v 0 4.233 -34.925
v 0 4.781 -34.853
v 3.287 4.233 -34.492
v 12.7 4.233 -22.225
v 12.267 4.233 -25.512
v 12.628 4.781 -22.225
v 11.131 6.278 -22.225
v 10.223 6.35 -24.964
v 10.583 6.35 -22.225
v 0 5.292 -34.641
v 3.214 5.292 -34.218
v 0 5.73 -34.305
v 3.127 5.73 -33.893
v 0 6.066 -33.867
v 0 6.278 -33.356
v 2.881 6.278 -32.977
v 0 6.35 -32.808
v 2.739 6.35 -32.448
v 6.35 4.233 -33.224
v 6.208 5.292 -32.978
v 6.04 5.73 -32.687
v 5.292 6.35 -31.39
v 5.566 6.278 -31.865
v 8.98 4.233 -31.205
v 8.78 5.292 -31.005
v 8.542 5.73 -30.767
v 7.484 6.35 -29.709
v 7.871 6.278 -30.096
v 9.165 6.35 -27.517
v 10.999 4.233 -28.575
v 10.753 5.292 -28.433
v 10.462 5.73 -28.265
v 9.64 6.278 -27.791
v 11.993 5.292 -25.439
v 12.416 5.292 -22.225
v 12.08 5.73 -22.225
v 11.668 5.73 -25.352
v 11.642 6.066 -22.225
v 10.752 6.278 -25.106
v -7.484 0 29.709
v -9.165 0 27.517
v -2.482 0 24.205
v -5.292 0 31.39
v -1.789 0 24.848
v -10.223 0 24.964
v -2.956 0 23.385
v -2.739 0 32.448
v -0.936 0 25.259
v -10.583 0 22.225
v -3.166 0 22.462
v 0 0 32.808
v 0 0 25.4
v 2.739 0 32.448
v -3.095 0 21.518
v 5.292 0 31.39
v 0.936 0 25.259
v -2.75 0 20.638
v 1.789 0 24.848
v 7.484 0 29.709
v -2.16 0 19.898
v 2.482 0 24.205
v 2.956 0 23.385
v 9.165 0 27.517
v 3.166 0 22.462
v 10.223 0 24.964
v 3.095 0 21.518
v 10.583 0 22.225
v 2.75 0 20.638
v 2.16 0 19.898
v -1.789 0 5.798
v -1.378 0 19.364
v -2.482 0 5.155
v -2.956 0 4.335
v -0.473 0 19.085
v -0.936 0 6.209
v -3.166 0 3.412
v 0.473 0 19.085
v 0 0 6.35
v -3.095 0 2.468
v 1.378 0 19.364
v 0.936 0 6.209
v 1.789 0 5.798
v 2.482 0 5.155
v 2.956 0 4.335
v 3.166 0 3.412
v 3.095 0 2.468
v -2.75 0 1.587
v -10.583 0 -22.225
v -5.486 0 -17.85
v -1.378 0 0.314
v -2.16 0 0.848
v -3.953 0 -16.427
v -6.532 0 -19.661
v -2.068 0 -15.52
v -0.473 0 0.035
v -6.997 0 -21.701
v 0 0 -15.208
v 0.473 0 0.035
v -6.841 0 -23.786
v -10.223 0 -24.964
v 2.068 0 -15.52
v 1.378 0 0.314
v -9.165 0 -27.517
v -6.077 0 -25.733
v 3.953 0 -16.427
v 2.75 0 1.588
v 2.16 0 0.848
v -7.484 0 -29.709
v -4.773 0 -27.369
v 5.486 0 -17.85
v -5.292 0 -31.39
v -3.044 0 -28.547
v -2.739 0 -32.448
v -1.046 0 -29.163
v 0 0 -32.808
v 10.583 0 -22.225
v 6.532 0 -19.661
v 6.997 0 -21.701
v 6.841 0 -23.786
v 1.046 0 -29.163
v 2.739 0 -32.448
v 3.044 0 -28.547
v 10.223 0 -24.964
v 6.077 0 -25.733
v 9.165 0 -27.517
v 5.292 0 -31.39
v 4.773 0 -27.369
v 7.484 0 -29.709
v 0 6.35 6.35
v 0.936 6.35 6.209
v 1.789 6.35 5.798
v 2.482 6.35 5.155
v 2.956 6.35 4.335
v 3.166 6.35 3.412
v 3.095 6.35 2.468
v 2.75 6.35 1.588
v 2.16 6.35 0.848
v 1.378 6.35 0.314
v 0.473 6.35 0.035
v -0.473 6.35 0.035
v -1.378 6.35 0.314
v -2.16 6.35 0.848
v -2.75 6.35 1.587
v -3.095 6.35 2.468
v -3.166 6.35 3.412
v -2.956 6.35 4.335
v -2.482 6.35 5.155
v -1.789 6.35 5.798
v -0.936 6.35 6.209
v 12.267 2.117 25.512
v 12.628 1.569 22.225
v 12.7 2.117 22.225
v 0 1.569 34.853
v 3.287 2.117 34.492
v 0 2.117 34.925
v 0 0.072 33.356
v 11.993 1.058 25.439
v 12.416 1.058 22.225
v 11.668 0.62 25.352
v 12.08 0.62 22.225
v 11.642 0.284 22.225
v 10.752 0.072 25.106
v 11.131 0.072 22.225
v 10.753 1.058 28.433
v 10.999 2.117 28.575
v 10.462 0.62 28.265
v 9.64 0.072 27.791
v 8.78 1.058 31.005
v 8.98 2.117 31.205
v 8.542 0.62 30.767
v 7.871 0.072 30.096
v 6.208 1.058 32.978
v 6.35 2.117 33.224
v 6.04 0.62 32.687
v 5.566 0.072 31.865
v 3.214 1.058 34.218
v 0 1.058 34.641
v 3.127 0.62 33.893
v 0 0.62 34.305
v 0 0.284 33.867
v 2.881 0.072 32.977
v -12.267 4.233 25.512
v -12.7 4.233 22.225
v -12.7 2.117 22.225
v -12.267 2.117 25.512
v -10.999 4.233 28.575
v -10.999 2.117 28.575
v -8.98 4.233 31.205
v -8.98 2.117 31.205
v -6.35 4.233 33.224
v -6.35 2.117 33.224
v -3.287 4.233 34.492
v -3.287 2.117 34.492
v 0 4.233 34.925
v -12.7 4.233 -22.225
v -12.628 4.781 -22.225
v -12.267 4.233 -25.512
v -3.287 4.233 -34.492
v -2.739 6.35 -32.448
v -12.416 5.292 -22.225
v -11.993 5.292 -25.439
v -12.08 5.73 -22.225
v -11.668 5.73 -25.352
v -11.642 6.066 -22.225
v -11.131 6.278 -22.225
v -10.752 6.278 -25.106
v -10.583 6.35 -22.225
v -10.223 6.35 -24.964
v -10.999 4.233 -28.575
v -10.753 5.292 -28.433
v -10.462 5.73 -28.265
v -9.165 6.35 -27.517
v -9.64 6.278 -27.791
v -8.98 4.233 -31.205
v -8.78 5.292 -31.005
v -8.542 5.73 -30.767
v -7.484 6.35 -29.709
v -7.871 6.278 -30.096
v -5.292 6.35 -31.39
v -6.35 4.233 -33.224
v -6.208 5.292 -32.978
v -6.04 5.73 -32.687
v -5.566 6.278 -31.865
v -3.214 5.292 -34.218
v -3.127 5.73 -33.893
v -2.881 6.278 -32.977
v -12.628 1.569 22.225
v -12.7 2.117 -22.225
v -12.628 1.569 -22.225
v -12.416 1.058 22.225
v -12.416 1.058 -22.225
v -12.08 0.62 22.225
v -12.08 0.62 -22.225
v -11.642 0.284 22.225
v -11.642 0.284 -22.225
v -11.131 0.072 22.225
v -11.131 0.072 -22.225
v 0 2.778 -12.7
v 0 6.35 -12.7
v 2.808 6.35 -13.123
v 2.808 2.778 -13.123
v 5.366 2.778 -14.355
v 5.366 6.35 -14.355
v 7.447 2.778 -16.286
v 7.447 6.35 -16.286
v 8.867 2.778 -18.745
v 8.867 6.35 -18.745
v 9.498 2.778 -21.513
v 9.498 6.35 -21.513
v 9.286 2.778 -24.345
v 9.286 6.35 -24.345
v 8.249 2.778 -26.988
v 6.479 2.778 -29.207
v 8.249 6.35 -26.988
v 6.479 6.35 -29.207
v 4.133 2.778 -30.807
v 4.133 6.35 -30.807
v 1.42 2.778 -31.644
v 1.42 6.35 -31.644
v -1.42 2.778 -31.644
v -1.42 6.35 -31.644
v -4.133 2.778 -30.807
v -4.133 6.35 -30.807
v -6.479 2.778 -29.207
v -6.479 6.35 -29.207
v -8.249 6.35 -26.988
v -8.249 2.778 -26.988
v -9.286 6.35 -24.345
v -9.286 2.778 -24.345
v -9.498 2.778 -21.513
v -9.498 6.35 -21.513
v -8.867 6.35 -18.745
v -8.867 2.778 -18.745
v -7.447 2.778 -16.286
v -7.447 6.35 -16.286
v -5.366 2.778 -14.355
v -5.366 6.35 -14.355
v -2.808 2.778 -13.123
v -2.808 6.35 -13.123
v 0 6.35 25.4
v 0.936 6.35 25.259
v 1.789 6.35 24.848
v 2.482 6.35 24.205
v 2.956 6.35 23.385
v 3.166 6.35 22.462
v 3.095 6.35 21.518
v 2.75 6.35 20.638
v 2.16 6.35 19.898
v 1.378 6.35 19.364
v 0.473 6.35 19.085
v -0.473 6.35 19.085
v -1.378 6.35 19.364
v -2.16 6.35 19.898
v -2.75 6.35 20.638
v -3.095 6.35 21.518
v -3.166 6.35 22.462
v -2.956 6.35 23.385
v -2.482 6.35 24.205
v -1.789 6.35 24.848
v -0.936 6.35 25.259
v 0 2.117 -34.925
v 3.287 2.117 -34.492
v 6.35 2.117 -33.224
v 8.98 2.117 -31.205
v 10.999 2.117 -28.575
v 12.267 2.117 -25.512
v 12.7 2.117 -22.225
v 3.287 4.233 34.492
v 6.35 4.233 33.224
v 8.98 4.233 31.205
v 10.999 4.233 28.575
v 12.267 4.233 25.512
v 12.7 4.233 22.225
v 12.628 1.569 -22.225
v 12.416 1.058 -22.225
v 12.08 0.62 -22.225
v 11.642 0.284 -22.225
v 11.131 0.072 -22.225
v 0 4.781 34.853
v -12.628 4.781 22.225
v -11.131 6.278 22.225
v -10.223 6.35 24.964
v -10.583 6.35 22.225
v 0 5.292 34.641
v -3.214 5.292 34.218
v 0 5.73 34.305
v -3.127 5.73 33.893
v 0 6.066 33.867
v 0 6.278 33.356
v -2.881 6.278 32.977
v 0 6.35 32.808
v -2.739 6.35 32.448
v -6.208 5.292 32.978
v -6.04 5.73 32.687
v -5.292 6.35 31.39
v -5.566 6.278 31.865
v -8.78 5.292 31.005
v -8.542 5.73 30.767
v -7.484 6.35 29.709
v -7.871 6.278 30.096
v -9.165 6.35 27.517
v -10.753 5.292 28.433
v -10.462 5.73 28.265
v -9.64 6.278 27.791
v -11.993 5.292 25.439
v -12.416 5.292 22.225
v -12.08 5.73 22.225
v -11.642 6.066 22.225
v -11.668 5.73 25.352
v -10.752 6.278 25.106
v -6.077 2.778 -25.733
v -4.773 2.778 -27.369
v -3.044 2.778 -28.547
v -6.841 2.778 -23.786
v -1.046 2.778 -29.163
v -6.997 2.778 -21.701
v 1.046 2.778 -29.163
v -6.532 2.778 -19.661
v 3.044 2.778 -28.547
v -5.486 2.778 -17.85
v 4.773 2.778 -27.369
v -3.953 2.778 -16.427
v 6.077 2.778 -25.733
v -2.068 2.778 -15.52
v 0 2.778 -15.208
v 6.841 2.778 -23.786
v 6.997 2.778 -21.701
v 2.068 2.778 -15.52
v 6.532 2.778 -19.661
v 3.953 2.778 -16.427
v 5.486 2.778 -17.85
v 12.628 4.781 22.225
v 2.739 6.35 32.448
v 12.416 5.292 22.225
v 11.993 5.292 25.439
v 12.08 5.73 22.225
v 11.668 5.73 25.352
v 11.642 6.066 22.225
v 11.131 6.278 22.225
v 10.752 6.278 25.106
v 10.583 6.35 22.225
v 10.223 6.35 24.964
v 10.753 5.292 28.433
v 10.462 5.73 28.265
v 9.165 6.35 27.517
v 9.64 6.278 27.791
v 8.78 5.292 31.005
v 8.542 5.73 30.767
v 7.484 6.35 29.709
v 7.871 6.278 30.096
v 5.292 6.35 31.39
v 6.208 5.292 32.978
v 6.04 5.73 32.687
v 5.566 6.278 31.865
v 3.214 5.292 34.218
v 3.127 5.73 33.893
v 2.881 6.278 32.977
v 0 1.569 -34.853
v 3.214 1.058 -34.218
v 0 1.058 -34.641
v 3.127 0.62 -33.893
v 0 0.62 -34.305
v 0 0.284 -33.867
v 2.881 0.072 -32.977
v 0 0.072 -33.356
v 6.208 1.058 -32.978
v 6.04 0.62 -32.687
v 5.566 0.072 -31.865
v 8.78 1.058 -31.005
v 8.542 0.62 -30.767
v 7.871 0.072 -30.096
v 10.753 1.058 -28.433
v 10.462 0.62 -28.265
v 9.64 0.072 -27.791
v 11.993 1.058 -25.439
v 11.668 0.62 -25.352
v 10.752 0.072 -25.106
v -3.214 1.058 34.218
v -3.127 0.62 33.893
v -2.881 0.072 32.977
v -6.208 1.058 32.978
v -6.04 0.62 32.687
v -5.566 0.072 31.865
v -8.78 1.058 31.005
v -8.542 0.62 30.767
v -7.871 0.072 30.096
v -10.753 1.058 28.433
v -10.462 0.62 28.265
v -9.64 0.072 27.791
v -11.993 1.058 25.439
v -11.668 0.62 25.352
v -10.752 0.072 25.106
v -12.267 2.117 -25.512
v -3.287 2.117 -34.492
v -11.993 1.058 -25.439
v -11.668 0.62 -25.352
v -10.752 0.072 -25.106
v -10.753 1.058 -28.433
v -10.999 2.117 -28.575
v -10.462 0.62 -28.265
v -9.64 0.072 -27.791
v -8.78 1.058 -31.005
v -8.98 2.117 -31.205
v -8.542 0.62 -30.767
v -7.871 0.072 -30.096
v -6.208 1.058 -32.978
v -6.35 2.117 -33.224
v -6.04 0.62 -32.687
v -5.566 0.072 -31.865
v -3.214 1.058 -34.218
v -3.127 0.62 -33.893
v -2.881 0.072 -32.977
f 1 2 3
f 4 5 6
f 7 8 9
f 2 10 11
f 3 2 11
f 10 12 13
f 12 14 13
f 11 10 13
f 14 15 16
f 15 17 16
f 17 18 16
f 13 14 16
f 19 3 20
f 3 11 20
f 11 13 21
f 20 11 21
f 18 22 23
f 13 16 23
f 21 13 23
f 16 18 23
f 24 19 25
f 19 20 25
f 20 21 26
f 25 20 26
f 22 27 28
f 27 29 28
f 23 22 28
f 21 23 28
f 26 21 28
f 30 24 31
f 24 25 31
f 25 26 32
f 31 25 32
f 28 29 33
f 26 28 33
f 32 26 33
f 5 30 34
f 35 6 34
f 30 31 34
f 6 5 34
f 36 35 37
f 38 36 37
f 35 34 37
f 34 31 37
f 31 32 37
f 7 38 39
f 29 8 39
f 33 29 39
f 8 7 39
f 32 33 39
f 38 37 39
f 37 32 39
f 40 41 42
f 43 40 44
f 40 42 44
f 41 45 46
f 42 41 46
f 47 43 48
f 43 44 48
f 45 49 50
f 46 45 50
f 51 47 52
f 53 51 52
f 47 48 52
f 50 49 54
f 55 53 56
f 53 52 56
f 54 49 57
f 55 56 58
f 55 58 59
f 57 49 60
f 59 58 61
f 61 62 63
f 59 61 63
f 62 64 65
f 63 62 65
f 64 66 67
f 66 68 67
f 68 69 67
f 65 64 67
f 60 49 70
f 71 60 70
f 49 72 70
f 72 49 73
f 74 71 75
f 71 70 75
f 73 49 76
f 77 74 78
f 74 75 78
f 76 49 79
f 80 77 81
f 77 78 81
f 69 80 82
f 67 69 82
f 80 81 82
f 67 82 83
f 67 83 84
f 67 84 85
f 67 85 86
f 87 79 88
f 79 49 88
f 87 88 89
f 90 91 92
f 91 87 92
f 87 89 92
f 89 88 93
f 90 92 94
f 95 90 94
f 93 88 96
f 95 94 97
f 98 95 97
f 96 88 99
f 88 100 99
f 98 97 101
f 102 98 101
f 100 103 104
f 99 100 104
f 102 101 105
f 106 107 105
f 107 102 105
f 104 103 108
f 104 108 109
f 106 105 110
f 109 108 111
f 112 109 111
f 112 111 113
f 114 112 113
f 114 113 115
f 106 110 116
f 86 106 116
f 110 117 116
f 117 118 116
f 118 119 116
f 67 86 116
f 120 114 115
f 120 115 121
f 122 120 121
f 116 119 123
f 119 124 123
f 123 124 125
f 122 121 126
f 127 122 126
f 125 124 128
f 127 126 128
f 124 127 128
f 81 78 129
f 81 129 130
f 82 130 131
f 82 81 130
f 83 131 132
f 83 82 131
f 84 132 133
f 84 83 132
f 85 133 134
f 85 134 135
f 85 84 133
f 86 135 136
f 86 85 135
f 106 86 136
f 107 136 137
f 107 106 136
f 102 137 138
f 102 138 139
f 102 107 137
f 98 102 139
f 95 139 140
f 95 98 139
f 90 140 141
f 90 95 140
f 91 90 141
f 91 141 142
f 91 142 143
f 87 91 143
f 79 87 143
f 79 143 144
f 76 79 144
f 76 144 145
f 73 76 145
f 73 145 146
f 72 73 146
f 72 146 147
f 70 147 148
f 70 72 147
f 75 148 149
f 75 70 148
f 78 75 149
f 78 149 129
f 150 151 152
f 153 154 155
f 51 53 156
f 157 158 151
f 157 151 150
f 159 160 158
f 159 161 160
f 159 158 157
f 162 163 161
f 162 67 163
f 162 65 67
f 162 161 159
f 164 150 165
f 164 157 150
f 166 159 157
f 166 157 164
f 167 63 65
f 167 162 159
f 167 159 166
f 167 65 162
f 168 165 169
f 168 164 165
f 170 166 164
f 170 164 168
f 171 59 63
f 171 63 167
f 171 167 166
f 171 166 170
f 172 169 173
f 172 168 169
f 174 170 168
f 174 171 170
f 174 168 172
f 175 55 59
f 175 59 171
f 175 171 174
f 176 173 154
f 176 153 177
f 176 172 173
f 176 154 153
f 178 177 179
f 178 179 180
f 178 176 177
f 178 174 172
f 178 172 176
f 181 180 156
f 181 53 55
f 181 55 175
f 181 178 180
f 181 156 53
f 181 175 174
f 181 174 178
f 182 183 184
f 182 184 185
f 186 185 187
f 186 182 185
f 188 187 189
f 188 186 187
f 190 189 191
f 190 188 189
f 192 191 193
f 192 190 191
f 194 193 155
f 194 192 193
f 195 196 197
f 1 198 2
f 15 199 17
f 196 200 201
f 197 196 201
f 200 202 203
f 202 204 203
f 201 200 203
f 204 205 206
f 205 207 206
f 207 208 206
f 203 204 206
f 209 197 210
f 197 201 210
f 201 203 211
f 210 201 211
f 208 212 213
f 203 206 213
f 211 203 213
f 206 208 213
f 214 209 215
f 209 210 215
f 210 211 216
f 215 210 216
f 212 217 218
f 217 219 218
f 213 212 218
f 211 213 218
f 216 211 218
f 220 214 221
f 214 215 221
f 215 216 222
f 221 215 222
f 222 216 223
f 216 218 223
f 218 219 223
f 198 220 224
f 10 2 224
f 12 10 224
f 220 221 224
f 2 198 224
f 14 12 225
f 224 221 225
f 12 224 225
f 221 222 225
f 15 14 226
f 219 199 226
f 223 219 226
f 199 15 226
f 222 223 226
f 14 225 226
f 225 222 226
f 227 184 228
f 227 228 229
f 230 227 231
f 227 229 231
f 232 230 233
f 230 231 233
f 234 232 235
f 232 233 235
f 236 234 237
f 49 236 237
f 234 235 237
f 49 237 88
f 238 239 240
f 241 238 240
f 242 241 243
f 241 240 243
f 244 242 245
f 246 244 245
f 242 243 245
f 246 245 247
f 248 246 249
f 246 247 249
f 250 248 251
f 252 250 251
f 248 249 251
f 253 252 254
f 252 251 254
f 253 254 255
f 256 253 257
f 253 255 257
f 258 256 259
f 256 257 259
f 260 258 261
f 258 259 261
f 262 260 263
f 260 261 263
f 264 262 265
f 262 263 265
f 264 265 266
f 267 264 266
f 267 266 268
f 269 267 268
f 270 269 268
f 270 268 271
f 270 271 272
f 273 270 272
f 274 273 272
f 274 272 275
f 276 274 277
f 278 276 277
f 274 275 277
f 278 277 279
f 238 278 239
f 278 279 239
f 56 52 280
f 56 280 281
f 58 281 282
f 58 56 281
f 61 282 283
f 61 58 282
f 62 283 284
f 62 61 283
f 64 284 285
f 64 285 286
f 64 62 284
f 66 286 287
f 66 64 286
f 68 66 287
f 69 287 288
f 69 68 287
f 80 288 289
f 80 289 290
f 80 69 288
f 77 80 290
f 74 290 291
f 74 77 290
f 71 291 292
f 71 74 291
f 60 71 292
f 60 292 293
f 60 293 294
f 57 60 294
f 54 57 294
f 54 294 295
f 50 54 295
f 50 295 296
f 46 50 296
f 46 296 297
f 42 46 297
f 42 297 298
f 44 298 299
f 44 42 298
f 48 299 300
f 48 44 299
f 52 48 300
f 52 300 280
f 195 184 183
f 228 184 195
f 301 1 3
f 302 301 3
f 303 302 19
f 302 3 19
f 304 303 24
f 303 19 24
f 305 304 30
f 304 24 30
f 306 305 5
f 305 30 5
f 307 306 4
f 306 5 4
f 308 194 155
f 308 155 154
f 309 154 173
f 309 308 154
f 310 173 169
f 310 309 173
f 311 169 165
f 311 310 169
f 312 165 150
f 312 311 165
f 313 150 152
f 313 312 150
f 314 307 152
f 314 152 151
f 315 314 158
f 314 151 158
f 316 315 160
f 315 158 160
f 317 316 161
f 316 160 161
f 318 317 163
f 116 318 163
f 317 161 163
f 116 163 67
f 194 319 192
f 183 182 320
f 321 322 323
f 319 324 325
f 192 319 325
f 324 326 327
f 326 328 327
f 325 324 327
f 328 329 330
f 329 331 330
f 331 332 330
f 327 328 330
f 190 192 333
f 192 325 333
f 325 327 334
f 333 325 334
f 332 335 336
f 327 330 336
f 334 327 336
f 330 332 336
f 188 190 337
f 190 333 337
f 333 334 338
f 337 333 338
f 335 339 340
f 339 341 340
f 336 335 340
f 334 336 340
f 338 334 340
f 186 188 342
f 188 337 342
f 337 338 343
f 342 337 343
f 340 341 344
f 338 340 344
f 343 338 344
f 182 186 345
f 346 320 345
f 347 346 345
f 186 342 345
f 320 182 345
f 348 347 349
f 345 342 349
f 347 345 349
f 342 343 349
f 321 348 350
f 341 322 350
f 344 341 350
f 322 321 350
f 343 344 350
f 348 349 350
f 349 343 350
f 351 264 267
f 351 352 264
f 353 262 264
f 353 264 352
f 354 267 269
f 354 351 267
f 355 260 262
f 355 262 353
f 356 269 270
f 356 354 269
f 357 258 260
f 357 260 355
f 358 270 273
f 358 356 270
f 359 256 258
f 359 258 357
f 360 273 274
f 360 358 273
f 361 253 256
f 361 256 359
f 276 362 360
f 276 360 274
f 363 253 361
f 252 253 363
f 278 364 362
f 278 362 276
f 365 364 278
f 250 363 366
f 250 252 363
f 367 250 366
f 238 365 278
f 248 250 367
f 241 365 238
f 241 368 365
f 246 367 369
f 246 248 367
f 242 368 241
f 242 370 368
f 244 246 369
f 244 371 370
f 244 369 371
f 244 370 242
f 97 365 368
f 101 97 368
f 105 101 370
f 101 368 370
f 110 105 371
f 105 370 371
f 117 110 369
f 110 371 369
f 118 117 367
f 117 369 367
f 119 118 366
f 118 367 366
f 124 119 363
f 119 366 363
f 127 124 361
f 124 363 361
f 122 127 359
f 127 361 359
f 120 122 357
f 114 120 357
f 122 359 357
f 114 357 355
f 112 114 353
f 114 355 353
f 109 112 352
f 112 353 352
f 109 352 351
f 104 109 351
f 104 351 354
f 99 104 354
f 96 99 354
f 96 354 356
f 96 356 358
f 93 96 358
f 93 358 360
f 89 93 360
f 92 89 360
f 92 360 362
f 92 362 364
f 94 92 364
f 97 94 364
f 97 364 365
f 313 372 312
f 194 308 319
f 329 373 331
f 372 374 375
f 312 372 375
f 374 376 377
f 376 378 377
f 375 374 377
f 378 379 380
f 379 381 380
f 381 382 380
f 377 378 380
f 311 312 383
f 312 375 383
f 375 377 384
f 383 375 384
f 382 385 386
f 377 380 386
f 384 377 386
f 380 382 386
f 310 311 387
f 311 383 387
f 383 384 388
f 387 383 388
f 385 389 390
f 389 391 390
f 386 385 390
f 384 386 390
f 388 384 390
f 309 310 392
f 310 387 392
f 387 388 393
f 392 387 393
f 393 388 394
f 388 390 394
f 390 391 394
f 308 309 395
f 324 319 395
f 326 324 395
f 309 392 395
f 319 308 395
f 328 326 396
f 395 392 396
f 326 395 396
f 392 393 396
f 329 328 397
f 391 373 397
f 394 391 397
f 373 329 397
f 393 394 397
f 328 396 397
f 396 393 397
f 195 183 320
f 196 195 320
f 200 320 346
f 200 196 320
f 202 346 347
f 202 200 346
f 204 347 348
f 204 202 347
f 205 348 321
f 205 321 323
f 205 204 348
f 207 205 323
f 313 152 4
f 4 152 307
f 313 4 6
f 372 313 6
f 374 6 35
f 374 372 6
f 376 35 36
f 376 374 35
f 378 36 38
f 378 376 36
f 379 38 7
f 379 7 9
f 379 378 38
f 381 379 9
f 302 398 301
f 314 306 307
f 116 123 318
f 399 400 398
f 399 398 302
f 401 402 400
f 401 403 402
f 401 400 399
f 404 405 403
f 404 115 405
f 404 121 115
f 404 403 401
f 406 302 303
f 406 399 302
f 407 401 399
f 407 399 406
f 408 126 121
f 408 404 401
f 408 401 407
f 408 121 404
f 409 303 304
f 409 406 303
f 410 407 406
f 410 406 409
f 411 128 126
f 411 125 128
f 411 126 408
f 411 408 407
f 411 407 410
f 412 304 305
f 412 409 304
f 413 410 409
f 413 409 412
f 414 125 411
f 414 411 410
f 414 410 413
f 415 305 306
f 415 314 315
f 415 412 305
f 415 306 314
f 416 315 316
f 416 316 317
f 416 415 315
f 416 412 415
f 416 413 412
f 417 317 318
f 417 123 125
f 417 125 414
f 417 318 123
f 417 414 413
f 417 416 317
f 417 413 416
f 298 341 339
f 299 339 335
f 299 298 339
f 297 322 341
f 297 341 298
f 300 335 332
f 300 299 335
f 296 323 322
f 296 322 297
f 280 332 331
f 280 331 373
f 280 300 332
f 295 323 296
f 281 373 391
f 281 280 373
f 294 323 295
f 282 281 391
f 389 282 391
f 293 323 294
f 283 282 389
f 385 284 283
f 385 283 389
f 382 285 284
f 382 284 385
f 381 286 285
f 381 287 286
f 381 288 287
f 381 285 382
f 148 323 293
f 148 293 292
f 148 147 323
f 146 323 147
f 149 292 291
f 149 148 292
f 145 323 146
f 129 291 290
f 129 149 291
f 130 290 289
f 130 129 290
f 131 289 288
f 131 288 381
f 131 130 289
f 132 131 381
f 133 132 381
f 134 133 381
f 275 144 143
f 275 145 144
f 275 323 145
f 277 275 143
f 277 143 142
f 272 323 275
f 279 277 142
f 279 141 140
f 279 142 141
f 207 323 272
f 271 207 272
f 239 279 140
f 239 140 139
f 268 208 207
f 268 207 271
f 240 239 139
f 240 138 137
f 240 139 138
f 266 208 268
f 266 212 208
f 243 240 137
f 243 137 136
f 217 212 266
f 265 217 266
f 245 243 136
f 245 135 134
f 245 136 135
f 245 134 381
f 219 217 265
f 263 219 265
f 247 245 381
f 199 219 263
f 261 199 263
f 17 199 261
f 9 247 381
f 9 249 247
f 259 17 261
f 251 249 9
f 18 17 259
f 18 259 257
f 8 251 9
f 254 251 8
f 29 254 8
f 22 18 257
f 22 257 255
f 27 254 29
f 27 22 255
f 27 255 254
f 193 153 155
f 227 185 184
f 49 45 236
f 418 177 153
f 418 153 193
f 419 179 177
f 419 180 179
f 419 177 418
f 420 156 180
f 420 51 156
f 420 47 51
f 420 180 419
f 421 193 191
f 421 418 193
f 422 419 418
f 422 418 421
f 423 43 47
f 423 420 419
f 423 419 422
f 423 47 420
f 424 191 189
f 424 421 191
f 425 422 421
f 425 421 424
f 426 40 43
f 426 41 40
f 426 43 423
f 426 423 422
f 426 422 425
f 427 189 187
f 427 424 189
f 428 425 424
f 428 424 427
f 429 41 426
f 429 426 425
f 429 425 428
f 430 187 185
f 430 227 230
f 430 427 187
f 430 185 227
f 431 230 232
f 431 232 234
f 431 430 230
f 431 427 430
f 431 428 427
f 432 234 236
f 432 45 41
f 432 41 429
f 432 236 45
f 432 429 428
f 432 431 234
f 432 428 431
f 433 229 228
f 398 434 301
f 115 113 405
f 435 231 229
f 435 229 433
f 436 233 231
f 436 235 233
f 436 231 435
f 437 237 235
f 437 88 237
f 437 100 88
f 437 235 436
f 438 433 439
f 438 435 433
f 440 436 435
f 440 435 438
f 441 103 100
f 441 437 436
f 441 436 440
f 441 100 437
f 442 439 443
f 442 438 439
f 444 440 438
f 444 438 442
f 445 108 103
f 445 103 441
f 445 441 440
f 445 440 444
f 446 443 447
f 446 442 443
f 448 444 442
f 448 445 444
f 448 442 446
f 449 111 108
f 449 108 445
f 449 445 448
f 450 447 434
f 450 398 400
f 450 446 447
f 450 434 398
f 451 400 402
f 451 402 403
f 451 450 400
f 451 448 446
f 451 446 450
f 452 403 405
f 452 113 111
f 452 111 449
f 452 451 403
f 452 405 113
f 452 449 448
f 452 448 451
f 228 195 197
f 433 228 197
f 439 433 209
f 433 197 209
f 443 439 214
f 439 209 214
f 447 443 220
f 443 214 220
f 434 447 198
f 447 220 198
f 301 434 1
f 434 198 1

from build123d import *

# Parameters (mm, degrees)
SKETCH1_W           = 25.4
SKETCH1_H           = 69.85
SKETCH1_R           = 3.175
BOSS_EXTRUDE1_DEPTH = 6.35
FILLET1_R           = 12.7
FILLET2_R           = 2.116666667
SKETCH5_R           = 9.525
SKETCH5_R_2         = 7.016807895
CUT_EXTRUDE2_DEPTH  = 3.571875
SKETCH5_2_R         = 7.016807895
CUT_EXTRUDE3_DEPTH  = 6.35


with BuildPart() as part:
    # Sketch1 → Boss-Extrude1 (new body)
    with BuildSketch(Plane(origin=(0, 0, 0), x_dir=(1, 0, 0), z_dir=(0, 1, 0))):
        Rectangle(SKETCH1_W, SKETCH1_H)
        with Locations(Location((0, -3.175, 0), (0, 0, 270))):
            Circle(SKETCH1_R, mode=Mode.SUBTRACT)
        with Locations(Location((0, -22.225, 0), (0, 0, 270))):
            Circle(SKETCH1_R, mode=Mode.SUBTRACT)
    extrude(amount=BOSS_EXTRUDE1_DEPTH)

    # Fillet1
    fillet1_edges = [part.edges().sort_by_distance(p)[0] for p in [
        (-12.7, 3.175, -34.925),
        (12.7, 3.175, -34.925),
        (-12.7, 3.175, 34.925),
        (12.7, 3.175, 34.925),
    ]]
    fillet(fillet1_edges, radius=FILLET1_R - 0.0001)  # a hair under: the kernel refuses the full size

    # Fillet2
    fillet2_edges = [part.edges().sort_by_distance(p)[0] for p in [
        (-12.7, 0, 0),
        (-12.7, 6.35, 0),
        (12.7, 0, 0),
        (8.98028541, 0, 31.20528541),
        (-8.98028541, 0, 31.20528541),
        (8.98028541, 0, -31.20528541),
        (-8.98028541, 0, -31.20528541),
        (12.7, 6.35, 0),
        (8.98028541, 6.35, 31.20528541),
        (-8.98028541, 6.35, 31.20528541),
        (8.98028541, 6.35, -31.20528541),
        (-8.98028541, 6.35, -31.20528541),
    ]]
    fillet(fillet2_edges, radius=FILLET2_R)

    # Sketch5 → Cut-Extrude2 (cut)
    with BuildSketch(Plane(origin=(0, 6.35, 0), x_dir=(1, 0, 0), z_dir=(0, 1, 0))):
        with Locations(Location((0, 22.225, 0), (0, 0, 270))):
            Circle(SKETCH5_R)
        with Locations(Location((0, 22.225, 0), (0, 0, 270))):
            Circle(SKETCH5_R_2, mode=Mode.SUBTRACT)
    extrude(amount=-CUT_EXTRUDE2_DEPTH, mode=Mode.SUBTRACT)

    # Sketch5<2> → Cut-Extrude3 (cut)
    with BuildSketch(Plane(origin=(0, 6.35, 0), x_dir=(1, 0, 0), z_dir=(0, 1, 0))):
        with Locations(Location((0, 22.225, 0), (0, 0, 270))):
            Circle(SKETCH5_2_R)
    extrude(amount=-CUT_EXTRUDE3_DEPTH, mode=Mode.SUBTRACT)


solid = part.part
